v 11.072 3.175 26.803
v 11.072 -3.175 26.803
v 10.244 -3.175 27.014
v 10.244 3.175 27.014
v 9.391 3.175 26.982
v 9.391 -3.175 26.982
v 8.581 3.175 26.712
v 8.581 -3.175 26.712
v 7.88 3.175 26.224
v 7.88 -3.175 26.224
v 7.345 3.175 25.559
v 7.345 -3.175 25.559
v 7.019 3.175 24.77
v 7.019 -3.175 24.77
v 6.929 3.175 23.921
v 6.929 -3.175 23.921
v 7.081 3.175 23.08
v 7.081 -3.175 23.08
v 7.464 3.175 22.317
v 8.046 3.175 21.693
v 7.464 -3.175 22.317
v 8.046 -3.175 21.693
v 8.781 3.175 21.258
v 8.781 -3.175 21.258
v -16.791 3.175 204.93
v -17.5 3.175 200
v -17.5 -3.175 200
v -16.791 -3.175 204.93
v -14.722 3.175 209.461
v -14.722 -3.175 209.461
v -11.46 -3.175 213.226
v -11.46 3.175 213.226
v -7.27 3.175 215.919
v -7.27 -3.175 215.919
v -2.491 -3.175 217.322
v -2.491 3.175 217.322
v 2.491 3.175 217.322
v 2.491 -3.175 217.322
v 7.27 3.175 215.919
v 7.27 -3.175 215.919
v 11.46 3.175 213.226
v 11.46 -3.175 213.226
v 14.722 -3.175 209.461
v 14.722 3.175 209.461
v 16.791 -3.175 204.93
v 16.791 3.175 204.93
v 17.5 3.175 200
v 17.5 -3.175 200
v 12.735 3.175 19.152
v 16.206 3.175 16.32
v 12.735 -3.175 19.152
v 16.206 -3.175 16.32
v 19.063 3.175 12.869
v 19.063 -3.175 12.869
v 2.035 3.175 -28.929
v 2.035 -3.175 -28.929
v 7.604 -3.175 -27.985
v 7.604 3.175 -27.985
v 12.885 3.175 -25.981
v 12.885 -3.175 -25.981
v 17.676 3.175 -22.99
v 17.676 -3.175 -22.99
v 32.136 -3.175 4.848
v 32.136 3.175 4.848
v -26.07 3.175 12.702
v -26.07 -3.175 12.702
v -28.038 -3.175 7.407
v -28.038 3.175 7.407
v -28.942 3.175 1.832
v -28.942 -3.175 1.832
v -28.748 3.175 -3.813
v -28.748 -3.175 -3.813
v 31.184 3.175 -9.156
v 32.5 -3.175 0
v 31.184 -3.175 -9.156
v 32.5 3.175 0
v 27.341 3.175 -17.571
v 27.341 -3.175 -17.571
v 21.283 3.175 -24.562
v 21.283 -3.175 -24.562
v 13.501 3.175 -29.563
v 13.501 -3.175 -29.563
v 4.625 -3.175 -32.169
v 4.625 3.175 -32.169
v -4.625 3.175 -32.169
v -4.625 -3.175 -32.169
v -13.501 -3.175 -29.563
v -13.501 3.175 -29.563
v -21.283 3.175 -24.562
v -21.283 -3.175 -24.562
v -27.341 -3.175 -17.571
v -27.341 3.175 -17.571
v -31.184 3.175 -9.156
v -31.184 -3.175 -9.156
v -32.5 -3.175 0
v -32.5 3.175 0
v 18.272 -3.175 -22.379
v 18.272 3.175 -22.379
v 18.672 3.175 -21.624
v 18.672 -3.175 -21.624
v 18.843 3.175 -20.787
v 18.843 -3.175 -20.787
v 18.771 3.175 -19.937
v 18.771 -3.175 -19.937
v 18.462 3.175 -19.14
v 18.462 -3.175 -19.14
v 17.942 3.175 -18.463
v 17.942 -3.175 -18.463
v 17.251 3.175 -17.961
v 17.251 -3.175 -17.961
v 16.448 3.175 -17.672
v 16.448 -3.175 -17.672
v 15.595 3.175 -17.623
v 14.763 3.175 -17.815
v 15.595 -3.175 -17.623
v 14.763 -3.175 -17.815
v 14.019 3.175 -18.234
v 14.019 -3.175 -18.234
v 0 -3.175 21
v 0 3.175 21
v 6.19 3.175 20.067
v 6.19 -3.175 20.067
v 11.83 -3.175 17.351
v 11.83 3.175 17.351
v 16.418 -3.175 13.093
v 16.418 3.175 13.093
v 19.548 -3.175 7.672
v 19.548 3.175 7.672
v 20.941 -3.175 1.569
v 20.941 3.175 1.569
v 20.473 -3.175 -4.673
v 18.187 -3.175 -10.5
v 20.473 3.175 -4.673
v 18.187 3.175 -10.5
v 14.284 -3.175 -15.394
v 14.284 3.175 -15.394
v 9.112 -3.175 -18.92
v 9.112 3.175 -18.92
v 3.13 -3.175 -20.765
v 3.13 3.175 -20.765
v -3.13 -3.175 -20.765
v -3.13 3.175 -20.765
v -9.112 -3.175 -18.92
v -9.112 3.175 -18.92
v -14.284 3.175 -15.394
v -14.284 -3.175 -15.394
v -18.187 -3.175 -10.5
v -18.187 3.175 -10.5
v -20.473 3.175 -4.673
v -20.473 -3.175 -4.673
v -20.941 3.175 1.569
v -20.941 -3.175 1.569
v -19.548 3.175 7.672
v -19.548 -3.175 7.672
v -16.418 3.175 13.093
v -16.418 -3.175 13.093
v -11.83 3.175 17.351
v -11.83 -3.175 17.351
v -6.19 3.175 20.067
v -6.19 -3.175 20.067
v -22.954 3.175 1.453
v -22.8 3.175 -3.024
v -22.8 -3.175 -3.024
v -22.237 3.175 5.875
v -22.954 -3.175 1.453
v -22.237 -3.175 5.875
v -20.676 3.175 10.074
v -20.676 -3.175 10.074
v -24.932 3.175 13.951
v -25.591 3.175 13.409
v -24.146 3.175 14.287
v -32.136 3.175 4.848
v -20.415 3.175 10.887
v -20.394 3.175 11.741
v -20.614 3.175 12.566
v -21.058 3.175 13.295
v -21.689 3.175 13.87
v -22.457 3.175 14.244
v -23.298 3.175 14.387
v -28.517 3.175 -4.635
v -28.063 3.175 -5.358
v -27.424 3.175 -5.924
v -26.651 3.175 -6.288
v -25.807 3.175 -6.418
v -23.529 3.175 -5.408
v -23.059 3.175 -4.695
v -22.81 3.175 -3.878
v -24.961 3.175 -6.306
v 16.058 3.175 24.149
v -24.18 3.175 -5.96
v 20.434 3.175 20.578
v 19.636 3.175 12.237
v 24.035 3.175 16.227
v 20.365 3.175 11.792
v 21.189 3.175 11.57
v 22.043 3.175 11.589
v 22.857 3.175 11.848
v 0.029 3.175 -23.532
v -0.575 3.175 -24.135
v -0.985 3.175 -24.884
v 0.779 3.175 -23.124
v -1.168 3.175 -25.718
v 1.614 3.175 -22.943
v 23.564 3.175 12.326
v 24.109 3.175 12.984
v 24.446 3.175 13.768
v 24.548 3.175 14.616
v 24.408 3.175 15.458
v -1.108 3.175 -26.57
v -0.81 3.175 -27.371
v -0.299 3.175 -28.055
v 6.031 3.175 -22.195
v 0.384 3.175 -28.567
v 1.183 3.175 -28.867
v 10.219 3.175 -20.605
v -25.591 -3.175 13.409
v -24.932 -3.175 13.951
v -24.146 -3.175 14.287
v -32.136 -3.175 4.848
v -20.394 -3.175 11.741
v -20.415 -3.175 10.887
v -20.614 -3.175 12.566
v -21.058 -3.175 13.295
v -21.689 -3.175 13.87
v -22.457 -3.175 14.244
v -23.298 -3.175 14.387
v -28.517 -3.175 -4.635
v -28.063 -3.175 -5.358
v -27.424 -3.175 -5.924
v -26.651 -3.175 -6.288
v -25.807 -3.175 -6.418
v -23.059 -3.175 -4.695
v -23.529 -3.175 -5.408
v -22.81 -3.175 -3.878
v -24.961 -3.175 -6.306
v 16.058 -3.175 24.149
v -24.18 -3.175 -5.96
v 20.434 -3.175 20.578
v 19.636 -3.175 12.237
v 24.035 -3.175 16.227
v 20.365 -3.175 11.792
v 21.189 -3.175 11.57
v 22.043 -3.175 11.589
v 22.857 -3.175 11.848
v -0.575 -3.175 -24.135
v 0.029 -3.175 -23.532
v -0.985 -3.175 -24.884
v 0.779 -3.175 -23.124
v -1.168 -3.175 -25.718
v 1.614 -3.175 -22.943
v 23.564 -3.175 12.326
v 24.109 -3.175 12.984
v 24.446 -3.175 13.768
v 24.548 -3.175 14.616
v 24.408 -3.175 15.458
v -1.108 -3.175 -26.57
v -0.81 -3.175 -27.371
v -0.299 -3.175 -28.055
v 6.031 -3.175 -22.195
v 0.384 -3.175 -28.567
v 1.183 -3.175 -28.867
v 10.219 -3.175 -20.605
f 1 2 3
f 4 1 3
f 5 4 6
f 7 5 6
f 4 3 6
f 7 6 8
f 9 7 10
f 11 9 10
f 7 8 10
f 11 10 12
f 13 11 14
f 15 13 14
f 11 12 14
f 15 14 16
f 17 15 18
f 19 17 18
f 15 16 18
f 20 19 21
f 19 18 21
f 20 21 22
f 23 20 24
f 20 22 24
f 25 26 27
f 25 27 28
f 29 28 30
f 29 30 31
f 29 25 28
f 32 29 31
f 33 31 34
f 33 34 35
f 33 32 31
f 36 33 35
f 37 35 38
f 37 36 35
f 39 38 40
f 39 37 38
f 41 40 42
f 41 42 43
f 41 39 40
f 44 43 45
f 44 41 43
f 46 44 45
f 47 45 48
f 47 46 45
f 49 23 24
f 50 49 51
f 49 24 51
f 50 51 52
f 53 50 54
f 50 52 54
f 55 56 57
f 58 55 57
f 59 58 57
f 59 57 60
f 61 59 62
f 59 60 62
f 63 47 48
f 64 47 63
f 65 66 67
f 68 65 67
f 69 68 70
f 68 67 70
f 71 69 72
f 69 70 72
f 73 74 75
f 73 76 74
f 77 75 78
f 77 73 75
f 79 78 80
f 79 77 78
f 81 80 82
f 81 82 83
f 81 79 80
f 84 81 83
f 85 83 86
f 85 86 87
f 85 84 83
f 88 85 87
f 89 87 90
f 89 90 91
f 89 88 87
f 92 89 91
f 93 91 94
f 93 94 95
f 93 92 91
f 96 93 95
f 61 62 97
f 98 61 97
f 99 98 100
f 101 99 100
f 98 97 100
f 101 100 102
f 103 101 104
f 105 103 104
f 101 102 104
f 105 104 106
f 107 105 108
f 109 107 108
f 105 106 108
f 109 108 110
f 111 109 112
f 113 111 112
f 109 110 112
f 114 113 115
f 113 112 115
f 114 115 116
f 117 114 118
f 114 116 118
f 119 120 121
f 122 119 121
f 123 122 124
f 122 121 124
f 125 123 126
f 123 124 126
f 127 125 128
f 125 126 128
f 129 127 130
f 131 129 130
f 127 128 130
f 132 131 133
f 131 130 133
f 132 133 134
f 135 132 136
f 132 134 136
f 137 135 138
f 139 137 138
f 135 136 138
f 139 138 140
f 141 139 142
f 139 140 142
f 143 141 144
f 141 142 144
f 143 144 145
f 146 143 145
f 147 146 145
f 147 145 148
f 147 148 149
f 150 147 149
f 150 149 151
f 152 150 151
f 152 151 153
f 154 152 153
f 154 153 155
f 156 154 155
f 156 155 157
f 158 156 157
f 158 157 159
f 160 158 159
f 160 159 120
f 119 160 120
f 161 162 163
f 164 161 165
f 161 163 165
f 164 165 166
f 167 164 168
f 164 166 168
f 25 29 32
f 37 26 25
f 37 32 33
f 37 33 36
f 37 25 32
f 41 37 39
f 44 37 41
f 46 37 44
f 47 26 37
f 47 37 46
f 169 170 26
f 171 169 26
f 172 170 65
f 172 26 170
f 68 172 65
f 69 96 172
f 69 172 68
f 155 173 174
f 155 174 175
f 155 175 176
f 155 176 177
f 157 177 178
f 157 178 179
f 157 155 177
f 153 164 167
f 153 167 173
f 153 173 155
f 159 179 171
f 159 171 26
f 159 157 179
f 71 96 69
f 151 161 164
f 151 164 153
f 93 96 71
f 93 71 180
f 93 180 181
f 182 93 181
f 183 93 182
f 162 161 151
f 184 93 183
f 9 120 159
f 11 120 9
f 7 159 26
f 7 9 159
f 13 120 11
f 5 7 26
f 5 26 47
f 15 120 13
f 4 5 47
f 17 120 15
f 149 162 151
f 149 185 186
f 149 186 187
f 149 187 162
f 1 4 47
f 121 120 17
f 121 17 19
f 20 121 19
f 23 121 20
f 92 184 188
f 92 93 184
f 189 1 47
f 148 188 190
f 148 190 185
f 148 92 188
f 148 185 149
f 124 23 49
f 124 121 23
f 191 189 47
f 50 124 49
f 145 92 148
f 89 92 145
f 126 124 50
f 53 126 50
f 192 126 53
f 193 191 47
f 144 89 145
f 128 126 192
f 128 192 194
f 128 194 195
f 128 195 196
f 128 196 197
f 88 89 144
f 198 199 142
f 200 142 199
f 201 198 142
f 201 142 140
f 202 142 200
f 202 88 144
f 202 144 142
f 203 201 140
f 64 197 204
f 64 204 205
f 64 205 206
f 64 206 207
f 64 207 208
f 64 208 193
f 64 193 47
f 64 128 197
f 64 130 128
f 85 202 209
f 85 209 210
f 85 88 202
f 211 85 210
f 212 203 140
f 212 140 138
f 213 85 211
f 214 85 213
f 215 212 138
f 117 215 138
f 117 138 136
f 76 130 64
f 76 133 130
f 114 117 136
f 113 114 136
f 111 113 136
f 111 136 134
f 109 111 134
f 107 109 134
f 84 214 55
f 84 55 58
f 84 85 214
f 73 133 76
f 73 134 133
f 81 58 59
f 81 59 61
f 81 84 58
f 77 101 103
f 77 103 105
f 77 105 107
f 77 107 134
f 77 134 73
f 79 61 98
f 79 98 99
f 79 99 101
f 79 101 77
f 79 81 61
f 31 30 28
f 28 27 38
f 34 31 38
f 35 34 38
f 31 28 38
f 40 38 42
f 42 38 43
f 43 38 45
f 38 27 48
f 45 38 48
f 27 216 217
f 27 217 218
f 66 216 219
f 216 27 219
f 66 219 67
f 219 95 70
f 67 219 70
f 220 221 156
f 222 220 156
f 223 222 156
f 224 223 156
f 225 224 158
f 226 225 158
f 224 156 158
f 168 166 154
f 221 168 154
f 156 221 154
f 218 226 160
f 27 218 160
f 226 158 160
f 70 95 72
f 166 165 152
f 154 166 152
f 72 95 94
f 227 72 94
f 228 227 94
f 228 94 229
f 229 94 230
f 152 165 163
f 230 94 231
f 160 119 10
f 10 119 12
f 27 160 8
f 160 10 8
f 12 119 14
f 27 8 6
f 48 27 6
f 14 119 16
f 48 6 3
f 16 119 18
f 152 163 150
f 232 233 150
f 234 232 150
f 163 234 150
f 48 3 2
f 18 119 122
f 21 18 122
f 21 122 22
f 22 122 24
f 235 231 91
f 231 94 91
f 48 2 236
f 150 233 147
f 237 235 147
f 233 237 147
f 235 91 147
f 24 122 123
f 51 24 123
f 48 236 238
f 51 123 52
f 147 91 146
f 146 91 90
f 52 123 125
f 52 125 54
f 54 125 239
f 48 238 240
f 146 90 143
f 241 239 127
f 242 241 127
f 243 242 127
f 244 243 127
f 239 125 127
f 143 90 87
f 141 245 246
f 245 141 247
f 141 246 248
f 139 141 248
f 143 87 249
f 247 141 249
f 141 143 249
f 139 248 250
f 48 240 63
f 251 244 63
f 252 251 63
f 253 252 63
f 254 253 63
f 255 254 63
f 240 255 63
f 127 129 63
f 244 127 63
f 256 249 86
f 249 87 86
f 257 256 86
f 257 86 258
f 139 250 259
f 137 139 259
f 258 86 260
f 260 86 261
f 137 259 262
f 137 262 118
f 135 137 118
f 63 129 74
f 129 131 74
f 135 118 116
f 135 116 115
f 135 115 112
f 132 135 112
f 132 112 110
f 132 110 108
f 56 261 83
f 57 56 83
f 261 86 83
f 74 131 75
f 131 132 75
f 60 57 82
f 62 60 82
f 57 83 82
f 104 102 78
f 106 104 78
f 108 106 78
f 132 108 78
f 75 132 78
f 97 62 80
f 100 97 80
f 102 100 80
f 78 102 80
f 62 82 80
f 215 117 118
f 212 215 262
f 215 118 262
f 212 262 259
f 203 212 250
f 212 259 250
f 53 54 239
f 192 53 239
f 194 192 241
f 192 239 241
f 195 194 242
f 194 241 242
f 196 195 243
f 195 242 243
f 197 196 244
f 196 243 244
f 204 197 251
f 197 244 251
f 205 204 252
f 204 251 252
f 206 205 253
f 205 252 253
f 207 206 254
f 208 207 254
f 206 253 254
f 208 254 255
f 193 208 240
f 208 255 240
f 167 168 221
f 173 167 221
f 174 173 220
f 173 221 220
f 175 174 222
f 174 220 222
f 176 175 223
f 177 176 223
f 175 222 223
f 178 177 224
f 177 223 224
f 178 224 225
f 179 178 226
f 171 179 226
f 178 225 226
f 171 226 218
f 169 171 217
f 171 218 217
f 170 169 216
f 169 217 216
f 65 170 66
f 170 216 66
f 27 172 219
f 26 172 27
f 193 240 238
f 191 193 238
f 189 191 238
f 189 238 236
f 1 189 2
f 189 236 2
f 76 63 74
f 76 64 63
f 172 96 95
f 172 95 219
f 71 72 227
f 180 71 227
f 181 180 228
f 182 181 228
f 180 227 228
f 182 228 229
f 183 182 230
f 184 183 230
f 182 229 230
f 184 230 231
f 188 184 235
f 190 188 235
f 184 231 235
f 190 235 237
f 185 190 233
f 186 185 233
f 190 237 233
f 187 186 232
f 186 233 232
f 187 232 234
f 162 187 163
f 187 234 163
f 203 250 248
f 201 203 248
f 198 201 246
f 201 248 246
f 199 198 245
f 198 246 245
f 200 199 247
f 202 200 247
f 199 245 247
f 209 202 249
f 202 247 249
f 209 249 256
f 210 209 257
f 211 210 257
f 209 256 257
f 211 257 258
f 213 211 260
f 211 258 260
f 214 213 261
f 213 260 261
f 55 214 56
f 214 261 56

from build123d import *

# Parameters (mm, degrees)
SKETCH1_R           = 17.5
BOSS_EXTRUDE1_DEPTH = 3.175
SKETCH2_R           = 21
CUT_EXTRUDE1_DEPTH  = 221.006414679
CUT_EXTRUDE2_DEPTH  = 221.006414679
CIRPATTERN1_COUNT   = 3
CIRPATTERN1_ANGLE   = 240


with BuildPart() as part:
    # Sketch1 → Boss-Extrude1 (new, symmetric)
    with BuildSketch(Plane(origin=(0, 0, 0), x_dir=(1, 0, 0), z_dir=(0, 1, 0))):
        with BuildLine():
            ThreePointArc((32.5, 0), (0, 32.5), (-32.5, 0))
            Line((-32.5, 0), (-32.136420137, -4.84773151))
            ThreePointArc((-32.136420137, -4.84773151), (0, -32.5), (32.136420137, -4.84773151))
            Line((32.136420137, -4.84773151), (32.5, 0))
        make_face()
        with BuildLine():
            ThreePointArc((32.136420137, -4.84773151), (0, -32.5), (-32.136420137, -4.84773151))
            Line((-32.136420137, -4.84773151), (-17.5, -200))
            ThreePointArc((-17.5, -200), (0, -182.5), (17.5, -200))
            Line((17.5, -200), (32.136420137, -4.84773151))
        make_face()
        with Locations((0, -200)):
            Circle(SKETCH1_R)
    extrude(amount=BOSS_EXTRUDE1_DEPTH, both=True)

    # Sketch2 → Cut-Extrude1 (cut, through all)
    with BuildSketch(Plane(origin=(0, 3.175, 0), x_dir=(1, 0, 0), z_dir=(0, 1, 0))):
        with Locations(Location((0, 0, 0), (0, 0, 270))):
            Circle(SKETCH2_R)
    extrude(amount=-CUT_EXTRUDE1_DEPTH, mode=Mode.SUBTRACT)

    # Sketch4 → Cut-Extrude2 (cut, through all)
    with BuildSketch(Plane.XZ.offset(3.175)):
        with BuildLine():
            ThreePointArc((14.019152987, -18.233577529), (8.163533765, -21.502481635), (1.613875121, -22.943308547))
            ThreePointArc((1.613875121, -22.943308547), (-1.168224891, -26.14641946), (2.034886022, -28.928519473))
            ThreePointArc((2.034886022, -28.928519473), (10.293151268, -27.111824671), (17.676323332, -22.990162972))
            ThreePointArc((17.676323332, -22.990162972), (18.226030881, -18.783285078), (14.019152987, -18.233577529))
        make_face()
    cut_extrude2 = extrude(amount=-CUT_EXTRUDE2_DEPTH, mode=Mode.SUBTRACT)

    # CirPattern1: Cut-Extrude2 ×3 about axis
    cirpattern1_axis = Axis((0, 0, 0), (0, 1, 0))
    for i in range(1, CIRPATTERN1_COUNT):
        add(cut_extrude2.rotate(cirpattern1_axis, i * CIRPATTERN1_ANGLE / (CIRPATTERN1_COUNT - 1)), mode=Mode.SUBTRACT)


solid = part.part
